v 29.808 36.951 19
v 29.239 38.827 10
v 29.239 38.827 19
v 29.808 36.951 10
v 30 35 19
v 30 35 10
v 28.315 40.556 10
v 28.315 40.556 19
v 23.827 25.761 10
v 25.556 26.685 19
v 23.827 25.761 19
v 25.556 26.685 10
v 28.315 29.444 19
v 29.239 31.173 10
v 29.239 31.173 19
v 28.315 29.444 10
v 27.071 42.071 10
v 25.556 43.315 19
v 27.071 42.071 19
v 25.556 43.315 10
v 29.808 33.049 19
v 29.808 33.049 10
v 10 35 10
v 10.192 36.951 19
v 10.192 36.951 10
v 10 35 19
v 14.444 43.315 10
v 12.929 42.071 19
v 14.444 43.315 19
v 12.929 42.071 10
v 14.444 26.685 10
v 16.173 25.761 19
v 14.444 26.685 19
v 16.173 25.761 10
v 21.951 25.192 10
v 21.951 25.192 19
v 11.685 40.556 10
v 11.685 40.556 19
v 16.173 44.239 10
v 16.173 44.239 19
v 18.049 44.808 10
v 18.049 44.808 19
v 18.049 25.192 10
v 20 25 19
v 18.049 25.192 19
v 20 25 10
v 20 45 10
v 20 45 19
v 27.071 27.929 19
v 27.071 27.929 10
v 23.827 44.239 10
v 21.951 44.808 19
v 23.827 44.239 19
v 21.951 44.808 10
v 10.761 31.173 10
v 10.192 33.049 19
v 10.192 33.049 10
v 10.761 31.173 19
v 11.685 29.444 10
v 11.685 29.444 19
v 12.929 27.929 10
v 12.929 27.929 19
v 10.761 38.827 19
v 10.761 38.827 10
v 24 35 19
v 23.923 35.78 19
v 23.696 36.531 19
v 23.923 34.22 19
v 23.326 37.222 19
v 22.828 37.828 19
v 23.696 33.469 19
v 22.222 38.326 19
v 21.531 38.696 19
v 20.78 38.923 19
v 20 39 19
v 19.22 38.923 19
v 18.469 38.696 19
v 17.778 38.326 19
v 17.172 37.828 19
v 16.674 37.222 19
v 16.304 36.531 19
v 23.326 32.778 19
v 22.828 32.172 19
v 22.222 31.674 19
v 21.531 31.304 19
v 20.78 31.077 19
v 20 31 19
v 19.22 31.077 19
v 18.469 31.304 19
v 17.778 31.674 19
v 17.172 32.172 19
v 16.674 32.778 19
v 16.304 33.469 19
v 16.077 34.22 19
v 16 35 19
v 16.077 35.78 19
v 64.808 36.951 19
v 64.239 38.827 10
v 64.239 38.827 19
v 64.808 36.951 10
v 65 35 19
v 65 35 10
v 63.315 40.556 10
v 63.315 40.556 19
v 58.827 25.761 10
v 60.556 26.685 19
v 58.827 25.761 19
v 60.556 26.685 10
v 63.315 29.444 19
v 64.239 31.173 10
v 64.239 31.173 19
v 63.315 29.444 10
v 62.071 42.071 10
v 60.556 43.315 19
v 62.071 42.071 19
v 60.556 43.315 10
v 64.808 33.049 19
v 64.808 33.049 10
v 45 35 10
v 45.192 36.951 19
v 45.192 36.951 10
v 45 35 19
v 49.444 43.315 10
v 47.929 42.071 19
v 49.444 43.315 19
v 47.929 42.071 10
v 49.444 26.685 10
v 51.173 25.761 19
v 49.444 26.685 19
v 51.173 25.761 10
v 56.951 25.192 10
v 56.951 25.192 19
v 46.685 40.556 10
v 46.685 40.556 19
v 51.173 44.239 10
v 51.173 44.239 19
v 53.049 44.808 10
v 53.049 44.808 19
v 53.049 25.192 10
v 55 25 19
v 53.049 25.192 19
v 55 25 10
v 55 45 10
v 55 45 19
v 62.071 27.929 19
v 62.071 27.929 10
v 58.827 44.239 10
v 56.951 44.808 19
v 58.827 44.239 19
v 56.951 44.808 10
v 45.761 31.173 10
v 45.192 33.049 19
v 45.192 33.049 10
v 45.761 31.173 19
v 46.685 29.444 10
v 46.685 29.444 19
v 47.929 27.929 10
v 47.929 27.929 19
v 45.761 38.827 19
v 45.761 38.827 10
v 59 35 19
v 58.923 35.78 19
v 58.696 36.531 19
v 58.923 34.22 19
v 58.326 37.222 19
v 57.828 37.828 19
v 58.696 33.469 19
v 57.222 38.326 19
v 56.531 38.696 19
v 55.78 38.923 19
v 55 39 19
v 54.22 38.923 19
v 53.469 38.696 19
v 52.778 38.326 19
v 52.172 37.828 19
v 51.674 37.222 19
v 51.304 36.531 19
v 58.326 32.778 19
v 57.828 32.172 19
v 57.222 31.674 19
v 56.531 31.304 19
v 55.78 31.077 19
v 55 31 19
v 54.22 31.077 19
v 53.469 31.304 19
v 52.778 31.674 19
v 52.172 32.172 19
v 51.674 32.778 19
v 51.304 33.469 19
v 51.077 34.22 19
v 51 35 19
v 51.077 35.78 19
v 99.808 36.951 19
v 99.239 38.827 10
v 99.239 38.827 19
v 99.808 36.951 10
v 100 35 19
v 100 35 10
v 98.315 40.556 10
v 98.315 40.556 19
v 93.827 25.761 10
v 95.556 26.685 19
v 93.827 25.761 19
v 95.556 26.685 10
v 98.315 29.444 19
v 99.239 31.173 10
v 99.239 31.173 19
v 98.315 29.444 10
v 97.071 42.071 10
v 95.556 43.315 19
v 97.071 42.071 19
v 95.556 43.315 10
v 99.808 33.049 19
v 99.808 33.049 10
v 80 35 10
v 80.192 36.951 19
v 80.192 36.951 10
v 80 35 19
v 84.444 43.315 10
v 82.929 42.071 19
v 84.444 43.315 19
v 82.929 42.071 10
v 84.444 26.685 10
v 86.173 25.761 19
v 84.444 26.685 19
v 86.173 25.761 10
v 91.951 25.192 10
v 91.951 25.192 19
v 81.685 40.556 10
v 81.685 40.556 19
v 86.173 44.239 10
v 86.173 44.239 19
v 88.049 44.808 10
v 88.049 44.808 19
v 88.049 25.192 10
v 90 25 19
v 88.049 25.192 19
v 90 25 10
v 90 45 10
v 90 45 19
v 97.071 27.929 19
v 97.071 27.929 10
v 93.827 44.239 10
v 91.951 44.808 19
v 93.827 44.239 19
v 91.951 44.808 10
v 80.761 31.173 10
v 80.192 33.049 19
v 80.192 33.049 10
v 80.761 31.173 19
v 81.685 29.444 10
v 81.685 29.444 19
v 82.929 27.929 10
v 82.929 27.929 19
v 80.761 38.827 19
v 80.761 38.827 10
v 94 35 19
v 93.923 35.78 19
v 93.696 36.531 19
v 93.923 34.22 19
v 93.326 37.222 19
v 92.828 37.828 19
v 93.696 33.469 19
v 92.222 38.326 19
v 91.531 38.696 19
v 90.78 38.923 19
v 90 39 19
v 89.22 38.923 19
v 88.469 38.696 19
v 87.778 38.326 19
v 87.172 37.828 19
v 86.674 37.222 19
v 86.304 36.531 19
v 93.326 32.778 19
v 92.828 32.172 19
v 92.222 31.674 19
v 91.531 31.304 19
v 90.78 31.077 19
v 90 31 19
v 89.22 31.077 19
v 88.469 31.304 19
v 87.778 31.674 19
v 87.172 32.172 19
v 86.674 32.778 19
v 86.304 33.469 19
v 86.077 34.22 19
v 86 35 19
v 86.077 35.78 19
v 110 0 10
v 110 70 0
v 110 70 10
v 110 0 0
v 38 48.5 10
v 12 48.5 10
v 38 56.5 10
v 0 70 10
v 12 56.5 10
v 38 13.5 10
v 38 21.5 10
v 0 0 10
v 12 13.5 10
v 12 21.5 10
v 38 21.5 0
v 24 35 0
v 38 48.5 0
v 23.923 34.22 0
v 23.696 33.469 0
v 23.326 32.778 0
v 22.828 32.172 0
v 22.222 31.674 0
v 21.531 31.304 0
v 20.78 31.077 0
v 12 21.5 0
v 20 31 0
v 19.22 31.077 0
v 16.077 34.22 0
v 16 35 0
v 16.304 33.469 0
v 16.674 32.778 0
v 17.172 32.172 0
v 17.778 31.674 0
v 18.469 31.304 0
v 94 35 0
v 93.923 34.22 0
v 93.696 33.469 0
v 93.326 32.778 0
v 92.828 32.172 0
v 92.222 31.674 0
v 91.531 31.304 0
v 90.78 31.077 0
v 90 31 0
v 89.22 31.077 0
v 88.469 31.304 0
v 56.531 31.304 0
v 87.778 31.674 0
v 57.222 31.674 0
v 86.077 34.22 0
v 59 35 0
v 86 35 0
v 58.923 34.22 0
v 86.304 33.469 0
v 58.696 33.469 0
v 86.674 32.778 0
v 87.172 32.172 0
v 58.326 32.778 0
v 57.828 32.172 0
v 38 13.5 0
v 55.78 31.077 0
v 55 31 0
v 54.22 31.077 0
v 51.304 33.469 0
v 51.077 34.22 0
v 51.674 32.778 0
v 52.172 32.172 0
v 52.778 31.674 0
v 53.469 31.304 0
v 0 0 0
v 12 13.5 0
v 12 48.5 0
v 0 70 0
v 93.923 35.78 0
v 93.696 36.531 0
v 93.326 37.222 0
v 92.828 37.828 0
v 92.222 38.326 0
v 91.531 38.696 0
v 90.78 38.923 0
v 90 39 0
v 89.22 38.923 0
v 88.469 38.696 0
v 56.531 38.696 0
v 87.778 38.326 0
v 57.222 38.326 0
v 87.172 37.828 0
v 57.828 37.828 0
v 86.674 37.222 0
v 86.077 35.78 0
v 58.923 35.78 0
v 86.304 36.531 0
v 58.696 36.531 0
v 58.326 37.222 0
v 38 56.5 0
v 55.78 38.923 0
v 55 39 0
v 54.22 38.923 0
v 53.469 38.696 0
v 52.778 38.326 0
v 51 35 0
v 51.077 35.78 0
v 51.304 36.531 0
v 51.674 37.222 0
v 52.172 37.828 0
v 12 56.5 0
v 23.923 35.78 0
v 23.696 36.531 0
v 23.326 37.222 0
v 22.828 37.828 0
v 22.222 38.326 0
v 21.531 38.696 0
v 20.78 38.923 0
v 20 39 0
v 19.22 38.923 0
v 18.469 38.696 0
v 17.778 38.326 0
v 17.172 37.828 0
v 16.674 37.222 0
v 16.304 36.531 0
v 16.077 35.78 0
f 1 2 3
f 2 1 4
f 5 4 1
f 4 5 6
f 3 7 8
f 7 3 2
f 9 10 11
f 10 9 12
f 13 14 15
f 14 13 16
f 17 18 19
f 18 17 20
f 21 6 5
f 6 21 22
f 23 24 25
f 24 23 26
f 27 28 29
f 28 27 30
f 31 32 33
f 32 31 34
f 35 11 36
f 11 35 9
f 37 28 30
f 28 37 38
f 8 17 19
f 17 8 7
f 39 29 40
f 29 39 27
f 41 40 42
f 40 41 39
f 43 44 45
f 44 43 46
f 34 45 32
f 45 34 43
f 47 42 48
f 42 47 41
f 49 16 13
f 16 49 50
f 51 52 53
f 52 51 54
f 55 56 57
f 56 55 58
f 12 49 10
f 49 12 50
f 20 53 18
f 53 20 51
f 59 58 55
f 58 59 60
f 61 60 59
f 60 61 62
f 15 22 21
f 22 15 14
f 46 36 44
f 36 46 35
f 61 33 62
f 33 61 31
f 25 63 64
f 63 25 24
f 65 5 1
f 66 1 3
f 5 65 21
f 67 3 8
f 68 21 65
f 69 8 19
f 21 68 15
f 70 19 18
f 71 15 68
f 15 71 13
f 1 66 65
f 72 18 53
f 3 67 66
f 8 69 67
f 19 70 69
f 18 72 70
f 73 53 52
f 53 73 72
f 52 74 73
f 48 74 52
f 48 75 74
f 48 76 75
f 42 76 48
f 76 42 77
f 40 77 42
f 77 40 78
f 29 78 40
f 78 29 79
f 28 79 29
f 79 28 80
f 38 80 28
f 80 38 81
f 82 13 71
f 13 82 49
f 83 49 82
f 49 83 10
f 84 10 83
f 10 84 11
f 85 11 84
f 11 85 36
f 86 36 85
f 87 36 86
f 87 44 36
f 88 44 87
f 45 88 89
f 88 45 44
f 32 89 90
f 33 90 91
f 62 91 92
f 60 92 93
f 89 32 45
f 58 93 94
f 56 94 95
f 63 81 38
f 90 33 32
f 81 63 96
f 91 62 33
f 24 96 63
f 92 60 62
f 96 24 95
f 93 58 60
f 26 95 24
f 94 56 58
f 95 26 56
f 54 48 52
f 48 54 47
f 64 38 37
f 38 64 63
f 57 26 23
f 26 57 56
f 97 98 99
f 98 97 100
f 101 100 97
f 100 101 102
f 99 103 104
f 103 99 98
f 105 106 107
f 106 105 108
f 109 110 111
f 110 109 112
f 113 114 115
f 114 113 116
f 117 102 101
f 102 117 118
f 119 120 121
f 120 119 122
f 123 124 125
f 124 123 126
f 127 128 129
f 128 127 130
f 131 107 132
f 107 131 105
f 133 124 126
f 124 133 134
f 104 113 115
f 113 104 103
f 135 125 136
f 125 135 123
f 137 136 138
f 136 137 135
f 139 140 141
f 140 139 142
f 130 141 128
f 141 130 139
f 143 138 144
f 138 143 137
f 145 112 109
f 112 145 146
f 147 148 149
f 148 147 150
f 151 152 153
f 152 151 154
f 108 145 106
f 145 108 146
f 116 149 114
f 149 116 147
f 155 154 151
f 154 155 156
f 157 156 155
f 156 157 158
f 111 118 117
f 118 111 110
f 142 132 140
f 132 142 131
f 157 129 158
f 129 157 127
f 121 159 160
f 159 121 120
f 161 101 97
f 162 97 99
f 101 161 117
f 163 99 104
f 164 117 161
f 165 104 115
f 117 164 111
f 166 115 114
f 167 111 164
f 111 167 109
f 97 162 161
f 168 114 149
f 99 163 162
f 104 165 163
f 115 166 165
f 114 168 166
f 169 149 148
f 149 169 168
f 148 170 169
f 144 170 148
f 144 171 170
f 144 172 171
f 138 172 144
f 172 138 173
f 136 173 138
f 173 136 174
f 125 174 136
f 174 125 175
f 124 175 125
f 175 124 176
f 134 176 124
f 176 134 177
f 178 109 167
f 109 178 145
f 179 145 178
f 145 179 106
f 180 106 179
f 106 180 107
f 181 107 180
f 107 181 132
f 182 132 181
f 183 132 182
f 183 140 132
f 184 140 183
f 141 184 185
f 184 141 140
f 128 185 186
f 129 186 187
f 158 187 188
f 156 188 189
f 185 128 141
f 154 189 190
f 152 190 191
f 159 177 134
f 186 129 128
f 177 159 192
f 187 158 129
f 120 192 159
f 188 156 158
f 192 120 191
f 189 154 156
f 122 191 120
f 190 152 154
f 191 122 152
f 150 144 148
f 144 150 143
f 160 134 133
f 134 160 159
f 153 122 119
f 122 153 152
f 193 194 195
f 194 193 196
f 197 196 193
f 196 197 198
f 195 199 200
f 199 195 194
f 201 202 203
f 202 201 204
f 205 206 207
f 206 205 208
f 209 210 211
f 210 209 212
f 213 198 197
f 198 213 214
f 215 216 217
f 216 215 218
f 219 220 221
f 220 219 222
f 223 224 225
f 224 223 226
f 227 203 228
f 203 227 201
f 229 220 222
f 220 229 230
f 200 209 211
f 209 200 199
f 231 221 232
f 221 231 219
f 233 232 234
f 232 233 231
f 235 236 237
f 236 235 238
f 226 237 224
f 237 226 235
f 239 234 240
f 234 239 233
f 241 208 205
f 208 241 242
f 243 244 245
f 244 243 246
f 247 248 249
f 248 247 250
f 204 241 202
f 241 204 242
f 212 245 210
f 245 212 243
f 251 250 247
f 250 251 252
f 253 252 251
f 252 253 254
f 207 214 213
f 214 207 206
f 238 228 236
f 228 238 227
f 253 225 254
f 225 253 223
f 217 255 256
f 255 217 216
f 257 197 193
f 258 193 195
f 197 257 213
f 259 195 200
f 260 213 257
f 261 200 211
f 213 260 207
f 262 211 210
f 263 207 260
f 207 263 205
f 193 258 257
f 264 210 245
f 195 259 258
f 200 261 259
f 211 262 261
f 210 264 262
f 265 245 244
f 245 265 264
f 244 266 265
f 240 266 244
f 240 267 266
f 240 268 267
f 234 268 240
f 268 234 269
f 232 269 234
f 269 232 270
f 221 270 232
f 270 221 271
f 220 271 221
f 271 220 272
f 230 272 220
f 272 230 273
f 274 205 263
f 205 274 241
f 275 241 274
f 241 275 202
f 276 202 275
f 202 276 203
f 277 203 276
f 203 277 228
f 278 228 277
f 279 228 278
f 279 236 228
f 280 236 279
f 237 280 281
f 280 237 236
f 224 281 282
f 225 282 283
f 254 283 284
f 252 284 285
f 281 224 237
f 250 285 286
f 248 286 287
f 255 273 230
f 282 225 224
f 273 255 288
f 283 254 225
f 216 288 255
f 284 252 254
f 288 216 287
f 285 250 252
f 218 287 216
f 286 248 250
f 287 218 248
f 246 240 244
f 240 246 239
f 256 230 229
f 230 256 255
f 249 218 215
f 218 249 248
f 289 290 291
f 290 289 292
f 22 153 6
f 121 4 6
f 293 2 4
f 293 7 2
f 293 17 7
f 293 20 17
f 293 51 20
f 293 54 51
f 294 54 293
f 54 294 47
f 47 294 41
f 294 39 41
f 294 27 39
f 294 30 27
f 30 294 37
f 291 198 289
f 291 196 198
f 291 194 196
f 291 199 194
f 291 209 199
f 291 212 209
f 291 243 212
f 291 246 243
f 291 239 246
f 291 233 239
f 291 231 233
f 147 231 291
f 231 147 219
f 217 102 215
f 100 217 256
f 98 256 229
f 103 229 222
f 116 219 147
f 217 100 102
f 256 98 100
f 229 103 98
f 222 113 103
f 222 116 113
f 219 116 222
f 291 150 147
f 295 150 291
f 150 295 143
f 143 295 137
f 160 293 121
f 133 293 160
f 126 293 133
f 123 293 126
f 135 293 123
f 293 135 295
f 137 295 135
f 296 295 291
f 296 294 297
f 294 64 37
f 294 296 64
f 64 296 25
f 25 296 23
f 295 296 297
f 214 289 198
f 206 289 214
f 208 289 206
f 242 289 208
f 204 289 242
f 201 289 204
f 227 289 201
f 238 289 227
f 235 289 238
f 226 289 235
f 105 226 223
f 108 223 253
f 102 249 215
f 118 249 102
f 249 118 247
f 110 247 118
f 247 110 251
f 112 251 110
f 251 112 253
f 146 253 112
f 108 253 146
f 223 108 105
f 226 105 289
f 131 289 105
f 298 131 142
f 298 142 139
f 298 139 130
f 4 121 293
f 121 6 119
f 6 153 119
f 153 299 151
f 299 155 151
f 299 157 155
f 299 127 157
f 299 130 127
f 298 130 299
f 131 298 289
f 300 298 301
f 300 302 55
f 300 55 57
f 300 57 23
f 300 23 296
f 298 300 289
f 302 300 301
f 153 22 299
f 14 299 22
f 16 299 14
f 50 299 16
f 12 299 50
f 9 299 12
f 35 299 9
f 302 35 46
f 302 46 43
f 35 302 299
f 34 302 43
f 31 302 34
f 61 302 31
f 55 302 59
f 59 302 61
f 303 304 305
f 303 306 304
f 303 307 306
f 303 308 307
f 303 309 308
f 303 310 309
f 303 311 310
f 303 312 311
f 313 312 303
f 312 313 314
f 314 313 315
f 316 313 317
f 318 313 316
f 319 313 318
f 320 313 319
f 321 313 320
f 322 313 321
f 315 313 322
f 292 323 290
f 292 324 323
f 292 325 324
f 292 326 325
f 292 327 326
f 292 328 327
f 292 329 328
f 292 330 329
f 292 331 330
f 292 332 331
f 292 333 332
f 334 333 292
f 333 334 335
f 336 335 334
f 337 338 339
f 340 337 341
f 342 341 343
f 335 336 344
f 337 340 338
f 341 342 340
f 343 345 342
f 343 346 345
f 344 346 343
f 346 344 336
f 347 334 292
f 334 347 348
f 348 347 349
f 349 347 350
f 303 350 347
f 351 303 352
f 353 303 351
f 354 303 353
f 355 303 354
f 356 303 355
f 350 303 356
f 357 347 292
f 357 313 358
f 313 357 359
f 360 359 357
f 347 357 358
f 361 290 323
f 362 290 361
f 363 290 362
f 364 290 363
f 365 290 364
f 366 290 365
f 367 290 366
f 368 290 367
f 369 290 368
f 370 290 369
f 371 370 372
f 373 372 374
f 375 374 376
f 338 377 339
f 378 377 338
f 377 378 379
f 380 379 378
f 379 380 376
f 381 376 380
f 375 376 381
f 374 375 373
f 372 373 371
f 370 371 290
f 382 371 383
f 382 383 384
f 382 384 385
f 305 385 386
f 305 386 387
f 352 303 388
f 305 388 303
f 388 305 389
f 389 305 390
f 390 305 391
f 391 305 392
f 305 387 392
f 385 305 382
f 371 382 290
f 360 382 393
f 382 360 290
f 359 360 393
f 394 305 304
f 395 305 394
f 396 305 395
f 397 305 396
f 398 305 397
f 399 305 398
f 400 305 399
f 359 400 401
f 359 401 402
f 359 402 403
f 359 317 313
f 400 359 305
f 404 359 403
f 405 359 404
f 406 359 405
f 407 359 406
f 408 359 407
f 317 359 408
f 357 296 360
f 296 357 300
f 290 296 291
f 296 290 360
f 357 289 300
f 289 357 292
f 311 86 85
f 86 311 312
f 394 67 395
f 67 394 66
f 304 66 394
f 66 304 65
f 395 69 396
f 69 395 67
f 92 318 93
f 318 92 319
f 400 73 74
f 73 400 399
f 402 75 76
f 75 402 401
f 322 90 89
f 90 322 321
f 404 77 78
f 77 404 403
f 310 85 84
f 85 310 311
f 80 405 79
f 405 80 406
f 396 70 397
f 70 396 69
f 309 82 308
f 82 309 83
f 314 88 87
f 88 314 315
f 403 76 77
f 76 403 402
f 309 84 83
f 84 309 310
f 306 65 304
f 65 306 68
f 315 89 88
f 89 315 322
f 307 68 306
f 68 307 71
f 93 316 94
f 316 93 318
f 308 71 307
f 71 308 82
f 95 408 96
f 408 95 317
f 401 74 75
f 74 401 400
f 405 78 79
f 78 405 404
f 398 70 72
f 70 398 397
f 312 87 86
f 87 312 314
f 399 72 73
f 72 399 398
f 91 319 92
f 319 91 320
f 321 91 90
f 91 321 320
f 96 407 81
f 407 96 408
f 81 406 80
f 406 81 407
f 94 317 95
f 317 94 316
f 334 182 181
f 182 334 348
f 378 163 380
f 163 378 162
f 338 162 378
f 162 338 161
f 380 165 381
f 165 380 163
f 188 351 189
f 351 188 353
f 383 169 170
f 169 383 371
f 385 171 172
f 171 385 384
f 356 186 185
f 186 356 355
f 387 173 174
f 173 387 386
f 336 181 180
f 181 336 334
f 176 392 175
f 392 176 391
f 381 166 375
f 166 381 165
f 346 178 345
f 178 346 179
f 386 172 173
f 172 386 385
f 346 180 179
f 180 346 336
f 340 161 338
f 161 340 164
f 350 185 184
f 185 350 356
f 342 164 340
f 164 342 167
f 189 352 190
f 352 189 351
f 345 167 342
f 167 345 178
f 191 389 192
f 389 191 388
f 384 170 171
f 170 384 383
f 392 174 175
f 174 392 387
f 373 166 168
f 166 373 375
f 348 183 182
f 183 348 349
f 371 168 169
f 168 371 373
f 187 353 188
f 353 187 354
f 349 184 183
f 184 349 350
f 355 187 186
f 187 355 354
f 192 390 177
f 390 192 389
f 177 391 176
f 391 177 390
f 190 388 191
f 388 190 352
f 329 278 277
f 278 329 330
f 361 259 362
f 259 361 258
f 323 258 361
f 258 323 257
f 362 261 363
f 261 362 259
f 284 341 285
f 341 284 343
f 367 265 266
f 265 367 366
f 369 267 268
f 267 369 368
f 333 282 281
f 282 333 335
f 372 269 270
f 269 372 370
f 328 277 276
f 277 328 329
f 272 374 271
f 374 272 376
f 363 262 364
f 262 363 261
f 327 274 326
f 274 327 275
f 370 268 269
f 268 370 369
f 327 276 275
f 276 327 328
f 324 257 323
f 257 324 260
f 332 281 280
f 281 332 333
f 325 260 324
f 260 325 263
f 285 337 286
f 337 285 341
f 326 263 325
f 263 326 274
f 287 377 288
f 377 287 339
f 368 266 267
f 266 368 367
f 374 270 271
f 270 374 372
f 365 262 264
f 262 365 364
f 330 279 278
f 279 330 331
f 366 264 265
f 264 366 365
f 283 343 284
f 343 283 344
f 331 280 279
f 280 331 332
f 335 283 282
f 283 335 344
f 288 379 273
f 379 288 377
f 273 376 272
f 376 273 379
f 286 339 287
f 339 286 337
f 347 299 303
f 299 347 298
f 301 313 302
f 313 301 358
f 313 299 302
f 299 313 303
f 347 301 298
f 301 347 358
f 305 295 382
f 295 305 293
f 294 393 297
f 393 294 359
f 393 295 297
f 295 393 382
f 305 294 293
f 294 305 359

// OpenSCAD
$fn = 32;

// ----------------------------------------------------------------------
// Drill jig: three_boss_slot jig
// ----------------------------------------------------------------------

// --- parameters (mm) ---
plate_l = 110;            // plate length, X
plate_w = 70;             // plate width, Y
plate_t = 10;             // plate thickness
boss_d = 20;              // guide boss diameter
boss_h = 10;              // boss height above the plate
guide_d = 8;              // guide hole diameter
boss_pitch = 35;          // boss pitch
slot_w = 8;               // clamp slot width
slot_l = 26;              // clamp slot length
slot_x = 12;              // slot start X

n_boss = 3;  // guide bosses
boss_x0 = (plate_l - (n_boss - 1) * boss_pitch) / 2;  // first boss X
boss_top = plate_t - 1 + boss_h;  // boss crown height
total_h = boss_top;  // overall height

difference() {
  union() {
  cube([plate_l, plate_w, plate_t]);
  for (i = [0 : n_boss - 1])
    translate([boss_x0 + i * boss_pitch, plate_w / 2, plate_t - 1])
      cylinder(h = boss_h, d = boss_d);
  }
  for (i = [0 : n_boss - 1])
    translate([boss_x0 + i * boss_pitch, plate_w / 2, -1])
      cylinder(h = plate_t + boss_h, d = guide_d);
  for (cy = [plate_w * 0.25, plate_w * 0.75])
    translate([slot_x, cy - slot_w / 2, -1])
      cube([slot_l, slot_w, plate_t + 2]);
}
